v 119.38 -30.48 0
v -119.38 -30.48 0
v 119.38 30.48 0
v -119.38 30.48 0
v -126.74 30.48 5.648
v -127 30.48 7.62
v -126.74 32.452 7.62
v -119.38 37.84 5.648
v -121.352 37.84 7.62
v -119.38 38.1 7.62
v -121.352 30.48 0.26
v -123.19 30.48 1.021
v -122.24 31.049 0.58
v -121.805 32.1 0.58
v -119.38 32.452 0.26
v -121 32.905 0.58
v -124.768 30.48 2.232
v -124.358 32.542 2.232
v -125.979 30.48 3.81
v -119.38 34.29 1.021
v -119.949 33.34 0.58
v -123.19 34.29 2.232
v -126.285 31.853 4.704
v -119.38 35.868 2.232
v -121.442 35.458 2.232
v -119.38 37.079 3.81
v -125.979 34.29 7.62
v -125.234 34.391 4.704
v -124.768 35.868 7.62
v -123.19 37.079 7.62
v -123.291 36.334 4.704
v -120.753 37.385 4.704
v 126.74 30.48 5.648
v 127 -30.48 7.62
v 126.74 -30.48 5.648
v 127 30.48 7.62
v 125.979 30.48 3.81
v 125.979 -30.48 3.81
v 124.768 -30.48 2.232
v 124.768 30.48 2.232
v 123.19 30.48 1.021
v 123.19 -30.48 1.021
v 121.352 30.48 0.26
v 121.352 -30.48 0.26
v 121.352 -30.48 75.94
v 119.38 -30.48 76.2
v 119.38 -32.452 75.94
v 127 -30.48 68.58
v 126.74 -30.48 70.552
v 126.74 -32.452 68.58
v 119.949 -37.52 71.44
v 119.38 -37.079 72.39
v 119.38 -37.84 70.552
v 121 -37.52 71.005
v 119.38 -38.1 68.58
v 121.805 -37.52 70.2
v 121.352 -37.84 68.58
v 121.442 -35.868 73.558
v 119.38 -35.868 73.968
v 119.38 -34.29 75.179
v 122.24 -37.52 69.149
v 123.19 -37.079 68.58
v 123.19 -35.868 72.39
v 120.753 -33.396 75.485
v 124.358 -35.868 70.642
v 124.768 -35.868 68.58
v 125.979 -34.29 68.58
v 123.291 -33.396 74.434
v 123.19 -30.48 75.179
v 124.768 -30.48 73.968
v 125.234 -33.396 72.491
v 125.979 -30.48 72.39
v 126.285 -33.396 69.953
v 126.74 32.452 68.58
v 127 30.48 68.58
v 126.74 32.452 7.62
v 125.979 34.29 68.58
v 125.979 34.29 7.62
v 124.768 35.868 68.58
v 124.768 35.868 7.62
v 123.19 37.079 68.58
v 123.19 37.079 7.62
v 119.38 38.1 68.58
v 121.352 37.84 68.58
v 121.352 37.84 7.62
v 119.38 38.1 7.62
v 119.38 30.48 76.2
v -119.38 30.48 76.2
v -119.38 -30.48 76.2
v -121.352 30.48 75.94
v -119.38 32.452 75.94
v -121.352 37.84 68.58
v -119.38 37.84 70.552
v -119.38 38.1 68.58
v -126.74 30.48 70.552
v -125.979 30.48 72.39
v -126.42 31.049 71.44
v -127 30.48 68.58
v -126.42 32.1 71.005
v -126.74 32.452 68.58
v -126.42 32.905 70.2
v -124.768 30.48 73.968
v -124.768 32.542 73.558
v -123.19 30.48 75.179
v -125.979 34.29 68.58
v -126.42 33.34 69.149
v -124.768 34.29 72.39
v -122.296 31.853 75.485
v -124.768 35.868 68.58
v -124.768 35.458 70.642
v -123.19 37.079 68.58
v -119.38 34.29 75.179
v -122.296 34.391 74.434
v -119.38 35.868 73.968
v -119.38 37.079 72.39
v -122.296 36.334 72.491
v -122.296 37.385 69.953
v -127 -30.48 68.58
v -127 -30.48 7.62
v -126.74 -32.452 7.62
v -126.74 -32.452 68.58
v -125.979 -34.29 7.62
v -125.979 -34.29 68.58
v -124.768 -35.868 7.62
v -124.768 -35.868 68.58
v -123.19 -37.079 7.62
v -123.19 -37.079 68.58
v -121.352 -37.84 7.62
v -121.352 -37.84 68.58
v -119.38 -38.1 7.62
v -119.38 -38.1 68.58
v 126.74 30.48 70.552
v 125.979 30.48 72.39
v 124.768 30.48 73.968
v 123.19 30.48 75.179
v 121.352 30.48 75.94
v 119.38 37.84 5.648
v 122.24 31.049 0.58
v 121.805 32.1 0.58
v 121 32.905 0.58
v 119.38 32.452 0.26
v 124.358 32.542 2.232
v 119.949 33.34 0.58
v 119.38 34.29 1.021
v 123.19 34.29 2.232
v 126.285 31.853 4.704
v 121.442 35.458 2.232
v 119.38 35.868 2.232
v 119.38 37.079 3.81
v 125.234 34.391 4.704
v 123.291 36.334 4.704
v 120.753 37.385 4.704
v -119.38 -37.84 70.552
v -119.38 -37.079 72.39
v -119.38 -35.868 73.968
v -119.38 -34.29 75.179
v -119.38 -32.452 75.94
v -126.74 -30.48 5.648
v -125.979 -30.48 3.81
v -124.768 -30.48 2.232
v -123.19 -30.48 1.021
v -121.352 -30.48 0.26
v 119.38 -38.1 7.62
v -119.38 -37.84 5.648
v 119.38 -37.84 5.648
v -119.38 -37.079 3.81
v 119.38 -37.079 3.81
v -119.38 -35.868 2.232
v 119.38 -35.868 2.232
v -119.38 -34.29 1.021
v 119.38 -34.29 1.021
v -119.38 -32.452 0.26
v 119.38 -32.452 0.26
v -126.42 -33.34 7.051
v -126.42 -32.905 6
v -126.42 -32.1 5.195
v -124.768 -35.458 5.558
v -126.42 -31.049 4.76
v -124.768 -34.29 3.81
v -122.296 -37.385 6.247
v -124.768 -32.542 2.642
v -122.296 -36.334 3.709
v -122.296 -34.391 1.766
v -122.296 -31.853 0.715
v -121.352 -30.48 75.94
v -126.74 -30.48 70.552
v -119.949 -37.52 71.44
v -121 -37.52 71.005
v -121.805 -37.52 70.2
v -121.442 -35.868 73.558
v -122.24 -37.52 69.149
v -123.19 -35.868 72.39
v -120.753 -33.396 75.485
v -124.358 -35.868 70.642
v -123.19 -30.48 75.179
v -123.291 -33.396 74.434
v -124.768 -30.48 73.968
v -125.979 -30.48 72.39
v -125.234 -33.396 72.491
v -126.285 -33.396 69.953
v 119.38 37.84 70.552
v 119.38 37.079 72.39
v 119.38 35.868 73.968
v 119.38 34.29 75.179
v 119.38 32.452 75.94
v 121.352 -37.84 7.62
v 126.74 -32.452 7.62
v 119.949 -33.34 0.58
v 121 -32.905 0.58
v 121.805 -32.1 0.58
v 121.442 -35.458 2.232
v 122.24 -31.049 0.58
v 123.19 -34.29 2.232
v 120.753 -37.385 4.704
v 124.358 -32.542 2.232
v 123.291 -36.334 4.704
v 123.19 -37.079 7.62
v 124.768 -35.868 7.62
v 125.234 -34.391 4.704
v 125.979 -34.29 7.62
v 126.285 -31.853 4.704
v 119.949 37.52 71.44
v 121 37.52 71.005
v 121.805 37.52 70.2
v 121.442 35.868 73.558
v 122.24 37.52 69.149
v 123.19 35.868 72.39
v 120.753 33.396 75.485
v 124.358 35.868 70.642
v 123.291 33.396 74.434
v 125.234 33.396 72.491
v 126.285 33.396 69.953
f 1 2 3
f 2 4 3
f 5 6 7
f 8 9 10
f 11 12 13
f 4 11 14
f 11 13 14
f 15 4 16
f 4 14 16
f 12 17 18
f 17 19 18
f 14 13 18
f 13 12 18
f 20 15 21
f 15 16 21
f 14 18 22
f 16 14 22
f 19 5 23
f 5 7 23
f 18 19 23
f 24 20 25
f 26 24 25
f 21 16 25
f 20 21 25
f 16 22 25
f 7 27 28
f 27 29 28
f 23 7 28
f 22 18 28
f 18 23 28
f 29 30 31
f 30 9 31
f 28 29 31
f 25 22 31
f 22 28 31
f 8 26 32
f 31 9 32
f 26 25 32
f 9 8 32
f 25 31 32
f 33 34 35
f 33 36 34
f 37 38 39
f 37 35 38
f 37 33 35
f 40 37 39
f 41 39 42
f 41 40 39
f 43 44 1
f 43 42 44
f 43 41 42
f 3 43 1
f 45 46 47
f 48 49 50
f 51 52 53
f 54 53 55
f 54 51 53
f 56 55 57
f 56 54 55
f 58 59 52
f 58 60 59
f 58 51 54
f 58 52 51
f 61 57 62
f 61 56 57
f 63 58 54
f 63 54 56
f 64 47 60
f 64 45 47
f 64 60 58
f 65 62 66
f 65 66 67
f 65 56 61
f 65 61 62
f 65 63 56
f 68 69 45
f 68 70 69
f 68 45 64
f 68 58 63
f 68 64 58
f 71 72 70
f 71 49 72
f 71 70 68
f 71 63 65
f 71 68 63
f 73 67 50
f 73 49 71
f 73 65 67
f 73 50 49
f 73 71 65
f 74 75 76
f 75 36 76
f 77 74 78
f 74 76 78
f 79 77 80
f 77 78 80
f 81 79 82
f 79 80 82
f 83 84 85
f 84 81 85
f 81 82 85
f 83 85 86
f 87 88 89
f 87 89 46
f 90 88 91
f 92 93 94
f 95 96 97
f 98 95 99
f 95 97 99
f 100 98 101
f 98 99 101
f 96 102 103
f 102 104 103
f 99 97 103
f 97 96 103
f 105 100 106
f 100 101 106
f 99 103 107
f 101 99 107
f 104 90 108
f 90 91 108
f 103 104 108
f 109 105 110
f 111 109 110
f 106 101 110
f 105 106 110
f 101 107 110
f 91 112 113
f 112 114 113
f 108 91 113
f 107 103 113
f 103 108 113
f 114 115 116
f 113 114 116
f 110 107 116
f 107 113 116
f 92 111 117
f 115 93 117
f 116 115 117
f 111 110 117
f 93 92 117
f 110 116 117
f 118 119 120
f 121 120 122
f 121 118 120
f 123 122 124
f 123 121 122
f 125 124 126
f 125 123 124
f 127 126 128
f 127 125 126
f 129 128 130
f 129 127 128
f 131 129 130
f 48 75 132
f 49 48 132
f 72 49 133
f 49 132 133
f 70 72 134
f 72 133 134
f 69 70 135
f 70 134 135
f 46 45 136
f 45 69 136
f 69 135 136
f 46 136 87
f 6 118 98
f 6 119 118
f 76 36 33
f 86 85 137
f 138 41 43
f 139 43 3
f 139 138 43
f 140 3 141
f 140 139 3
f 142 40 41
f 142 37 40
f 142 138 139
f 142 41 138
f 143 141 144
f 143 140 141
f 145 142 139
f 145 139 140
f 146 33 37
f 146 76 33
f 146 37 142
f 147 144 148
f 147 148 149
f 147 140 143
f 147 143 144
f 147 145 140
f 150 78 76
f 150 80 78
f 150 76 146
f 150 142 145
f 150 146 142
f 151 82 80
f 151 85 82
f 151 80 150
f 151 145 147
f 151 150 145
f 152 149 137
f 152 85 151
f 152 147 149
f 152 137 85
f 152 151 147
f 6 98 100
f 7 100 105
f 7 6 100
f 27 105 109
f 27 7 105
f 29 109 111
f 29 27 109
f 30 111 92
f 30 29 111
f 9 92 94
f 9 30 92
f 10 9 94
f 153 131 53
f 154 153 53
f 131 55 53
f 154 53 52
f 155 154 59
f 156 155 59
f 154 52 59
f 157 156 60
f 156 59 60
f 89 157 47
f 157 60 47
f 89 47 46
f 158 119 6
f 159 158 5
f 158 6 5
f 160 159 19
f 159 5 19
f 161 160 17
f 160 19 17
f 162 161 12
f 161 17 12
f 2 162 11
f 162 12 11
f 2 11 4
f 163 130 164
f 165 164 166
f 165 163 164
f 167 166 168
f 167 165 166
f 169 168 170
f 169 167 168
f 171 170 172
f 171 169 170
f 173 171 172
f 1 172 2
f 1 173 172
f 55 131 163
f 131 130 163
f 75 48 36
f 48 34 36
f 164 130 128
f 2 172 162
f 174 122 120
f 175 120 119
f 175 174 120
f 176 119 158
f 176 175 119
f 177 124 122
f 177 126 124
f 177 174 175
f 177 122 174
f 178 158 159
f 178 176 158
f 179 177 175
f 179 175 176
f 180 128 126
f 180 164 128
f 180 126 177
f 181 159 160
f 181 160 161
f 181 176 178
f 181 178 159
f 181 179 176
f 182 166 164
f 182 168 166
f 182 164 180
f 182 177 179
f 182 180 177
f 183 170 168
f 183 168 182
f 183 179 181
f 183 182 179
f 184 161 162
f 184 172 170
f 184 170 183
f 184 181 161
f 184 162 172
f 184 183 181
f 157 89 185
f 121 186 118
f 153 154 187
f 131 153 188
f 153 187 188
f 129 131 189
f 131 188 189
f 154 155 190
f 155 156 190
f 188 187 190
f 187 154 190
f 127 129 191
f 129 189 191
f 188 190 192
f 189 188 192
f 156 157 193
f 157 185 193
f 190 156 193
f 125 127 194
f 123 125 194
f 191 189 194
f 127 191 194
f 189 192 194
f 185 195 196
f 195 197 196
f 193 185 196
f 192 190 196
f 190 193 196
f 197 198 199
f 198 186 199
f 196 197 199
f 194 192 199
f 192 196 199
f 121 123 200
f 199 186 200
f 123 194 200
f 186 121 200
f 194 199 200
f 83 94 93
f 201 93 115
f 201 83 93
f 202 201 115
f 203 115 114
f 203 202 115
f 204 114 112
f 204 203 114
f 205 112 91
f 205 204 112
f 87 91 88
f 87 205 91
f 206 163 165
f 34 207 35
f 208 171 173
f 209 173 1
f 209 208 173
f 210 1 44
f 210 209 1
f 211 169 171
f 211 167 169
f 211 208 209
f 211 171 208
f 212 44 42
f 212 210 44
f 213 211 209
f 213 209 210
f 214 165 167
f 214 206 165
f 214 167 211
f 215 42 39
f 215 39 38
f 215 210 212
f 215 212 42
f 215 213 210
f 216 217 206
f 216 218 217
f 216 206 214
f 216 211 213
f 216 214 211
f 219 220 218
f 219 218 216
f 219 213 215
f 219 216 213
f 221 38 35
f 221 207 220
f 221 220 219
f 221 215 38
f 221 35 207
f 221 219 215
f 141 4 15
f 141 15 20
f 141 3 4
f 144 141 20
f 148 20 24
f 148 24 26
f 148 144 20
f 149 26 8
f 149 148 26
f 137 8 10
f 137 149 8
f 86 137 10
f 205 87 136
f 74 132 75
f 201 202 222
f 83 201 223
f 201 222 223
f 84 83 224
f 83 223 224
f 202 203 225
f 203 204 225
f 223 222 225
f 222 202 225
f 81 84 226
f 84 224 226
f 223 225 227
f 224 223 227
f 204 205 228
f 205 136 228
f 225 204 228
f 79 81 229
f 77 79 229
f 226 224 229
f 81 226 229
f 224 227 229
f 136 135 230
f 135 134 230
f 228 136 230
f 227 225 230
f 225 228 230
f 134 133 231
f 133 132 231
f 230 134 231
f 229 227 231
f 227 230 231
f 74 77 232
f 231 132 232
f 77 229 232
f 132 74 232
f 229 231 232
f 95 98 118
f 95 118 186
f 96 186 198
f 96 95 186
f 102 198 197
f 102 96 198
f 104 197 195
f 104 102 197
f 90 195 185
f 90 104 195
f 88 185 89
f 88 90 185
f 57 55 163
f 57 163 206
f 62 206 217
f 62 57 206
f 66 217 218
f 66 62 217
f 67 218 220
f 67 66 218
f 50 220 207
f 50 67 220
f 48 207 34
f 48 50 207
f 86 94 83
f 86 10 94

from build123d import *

# Parameters (mm, degrees)
F0_W     = 254
F0_H     = 76.2
F1_DEPTH = 50.8
F2_DEPTH = 25.4
F3_R     = 7.62


with BuildPart() as f1:
    # F0 (on Top) → F1 (new body)
    with BuildSketch(Plane.XY):
        Rectangle(F0_W, F0_H)
    extrude(amount=F1_DEPTH)

    # F2 (add): a face of the model
    f2_faces = [f1.faces().sort_by_distance(p)[0] for p in [
        (0, 0, 50.8),
    ]]
    extrude(f2_faces, amount=F2_DEPTH)

    # F3
    f3_edges = [f1.edges().sort_by_distance(p)[0] for p in [
        (127, 0, 76.2),
        (0, 38.1, 76.2),
        (-127, 0, 76.2),
        (0, -38.1, 76.2),
        (127, -38.1, 38.1),
        (127, 38.1, 38.1),
        (0, -38.1, 0),
        (-127, -38.1, 38.1),
        (-127, 38.1, 38.1),
        (-127, 0, 0),
        (127, 0, 0),
        (0, 38.1, 0),
    ]]
    fillet(f3_edges, radius=F3_R)


solid = f1.part
